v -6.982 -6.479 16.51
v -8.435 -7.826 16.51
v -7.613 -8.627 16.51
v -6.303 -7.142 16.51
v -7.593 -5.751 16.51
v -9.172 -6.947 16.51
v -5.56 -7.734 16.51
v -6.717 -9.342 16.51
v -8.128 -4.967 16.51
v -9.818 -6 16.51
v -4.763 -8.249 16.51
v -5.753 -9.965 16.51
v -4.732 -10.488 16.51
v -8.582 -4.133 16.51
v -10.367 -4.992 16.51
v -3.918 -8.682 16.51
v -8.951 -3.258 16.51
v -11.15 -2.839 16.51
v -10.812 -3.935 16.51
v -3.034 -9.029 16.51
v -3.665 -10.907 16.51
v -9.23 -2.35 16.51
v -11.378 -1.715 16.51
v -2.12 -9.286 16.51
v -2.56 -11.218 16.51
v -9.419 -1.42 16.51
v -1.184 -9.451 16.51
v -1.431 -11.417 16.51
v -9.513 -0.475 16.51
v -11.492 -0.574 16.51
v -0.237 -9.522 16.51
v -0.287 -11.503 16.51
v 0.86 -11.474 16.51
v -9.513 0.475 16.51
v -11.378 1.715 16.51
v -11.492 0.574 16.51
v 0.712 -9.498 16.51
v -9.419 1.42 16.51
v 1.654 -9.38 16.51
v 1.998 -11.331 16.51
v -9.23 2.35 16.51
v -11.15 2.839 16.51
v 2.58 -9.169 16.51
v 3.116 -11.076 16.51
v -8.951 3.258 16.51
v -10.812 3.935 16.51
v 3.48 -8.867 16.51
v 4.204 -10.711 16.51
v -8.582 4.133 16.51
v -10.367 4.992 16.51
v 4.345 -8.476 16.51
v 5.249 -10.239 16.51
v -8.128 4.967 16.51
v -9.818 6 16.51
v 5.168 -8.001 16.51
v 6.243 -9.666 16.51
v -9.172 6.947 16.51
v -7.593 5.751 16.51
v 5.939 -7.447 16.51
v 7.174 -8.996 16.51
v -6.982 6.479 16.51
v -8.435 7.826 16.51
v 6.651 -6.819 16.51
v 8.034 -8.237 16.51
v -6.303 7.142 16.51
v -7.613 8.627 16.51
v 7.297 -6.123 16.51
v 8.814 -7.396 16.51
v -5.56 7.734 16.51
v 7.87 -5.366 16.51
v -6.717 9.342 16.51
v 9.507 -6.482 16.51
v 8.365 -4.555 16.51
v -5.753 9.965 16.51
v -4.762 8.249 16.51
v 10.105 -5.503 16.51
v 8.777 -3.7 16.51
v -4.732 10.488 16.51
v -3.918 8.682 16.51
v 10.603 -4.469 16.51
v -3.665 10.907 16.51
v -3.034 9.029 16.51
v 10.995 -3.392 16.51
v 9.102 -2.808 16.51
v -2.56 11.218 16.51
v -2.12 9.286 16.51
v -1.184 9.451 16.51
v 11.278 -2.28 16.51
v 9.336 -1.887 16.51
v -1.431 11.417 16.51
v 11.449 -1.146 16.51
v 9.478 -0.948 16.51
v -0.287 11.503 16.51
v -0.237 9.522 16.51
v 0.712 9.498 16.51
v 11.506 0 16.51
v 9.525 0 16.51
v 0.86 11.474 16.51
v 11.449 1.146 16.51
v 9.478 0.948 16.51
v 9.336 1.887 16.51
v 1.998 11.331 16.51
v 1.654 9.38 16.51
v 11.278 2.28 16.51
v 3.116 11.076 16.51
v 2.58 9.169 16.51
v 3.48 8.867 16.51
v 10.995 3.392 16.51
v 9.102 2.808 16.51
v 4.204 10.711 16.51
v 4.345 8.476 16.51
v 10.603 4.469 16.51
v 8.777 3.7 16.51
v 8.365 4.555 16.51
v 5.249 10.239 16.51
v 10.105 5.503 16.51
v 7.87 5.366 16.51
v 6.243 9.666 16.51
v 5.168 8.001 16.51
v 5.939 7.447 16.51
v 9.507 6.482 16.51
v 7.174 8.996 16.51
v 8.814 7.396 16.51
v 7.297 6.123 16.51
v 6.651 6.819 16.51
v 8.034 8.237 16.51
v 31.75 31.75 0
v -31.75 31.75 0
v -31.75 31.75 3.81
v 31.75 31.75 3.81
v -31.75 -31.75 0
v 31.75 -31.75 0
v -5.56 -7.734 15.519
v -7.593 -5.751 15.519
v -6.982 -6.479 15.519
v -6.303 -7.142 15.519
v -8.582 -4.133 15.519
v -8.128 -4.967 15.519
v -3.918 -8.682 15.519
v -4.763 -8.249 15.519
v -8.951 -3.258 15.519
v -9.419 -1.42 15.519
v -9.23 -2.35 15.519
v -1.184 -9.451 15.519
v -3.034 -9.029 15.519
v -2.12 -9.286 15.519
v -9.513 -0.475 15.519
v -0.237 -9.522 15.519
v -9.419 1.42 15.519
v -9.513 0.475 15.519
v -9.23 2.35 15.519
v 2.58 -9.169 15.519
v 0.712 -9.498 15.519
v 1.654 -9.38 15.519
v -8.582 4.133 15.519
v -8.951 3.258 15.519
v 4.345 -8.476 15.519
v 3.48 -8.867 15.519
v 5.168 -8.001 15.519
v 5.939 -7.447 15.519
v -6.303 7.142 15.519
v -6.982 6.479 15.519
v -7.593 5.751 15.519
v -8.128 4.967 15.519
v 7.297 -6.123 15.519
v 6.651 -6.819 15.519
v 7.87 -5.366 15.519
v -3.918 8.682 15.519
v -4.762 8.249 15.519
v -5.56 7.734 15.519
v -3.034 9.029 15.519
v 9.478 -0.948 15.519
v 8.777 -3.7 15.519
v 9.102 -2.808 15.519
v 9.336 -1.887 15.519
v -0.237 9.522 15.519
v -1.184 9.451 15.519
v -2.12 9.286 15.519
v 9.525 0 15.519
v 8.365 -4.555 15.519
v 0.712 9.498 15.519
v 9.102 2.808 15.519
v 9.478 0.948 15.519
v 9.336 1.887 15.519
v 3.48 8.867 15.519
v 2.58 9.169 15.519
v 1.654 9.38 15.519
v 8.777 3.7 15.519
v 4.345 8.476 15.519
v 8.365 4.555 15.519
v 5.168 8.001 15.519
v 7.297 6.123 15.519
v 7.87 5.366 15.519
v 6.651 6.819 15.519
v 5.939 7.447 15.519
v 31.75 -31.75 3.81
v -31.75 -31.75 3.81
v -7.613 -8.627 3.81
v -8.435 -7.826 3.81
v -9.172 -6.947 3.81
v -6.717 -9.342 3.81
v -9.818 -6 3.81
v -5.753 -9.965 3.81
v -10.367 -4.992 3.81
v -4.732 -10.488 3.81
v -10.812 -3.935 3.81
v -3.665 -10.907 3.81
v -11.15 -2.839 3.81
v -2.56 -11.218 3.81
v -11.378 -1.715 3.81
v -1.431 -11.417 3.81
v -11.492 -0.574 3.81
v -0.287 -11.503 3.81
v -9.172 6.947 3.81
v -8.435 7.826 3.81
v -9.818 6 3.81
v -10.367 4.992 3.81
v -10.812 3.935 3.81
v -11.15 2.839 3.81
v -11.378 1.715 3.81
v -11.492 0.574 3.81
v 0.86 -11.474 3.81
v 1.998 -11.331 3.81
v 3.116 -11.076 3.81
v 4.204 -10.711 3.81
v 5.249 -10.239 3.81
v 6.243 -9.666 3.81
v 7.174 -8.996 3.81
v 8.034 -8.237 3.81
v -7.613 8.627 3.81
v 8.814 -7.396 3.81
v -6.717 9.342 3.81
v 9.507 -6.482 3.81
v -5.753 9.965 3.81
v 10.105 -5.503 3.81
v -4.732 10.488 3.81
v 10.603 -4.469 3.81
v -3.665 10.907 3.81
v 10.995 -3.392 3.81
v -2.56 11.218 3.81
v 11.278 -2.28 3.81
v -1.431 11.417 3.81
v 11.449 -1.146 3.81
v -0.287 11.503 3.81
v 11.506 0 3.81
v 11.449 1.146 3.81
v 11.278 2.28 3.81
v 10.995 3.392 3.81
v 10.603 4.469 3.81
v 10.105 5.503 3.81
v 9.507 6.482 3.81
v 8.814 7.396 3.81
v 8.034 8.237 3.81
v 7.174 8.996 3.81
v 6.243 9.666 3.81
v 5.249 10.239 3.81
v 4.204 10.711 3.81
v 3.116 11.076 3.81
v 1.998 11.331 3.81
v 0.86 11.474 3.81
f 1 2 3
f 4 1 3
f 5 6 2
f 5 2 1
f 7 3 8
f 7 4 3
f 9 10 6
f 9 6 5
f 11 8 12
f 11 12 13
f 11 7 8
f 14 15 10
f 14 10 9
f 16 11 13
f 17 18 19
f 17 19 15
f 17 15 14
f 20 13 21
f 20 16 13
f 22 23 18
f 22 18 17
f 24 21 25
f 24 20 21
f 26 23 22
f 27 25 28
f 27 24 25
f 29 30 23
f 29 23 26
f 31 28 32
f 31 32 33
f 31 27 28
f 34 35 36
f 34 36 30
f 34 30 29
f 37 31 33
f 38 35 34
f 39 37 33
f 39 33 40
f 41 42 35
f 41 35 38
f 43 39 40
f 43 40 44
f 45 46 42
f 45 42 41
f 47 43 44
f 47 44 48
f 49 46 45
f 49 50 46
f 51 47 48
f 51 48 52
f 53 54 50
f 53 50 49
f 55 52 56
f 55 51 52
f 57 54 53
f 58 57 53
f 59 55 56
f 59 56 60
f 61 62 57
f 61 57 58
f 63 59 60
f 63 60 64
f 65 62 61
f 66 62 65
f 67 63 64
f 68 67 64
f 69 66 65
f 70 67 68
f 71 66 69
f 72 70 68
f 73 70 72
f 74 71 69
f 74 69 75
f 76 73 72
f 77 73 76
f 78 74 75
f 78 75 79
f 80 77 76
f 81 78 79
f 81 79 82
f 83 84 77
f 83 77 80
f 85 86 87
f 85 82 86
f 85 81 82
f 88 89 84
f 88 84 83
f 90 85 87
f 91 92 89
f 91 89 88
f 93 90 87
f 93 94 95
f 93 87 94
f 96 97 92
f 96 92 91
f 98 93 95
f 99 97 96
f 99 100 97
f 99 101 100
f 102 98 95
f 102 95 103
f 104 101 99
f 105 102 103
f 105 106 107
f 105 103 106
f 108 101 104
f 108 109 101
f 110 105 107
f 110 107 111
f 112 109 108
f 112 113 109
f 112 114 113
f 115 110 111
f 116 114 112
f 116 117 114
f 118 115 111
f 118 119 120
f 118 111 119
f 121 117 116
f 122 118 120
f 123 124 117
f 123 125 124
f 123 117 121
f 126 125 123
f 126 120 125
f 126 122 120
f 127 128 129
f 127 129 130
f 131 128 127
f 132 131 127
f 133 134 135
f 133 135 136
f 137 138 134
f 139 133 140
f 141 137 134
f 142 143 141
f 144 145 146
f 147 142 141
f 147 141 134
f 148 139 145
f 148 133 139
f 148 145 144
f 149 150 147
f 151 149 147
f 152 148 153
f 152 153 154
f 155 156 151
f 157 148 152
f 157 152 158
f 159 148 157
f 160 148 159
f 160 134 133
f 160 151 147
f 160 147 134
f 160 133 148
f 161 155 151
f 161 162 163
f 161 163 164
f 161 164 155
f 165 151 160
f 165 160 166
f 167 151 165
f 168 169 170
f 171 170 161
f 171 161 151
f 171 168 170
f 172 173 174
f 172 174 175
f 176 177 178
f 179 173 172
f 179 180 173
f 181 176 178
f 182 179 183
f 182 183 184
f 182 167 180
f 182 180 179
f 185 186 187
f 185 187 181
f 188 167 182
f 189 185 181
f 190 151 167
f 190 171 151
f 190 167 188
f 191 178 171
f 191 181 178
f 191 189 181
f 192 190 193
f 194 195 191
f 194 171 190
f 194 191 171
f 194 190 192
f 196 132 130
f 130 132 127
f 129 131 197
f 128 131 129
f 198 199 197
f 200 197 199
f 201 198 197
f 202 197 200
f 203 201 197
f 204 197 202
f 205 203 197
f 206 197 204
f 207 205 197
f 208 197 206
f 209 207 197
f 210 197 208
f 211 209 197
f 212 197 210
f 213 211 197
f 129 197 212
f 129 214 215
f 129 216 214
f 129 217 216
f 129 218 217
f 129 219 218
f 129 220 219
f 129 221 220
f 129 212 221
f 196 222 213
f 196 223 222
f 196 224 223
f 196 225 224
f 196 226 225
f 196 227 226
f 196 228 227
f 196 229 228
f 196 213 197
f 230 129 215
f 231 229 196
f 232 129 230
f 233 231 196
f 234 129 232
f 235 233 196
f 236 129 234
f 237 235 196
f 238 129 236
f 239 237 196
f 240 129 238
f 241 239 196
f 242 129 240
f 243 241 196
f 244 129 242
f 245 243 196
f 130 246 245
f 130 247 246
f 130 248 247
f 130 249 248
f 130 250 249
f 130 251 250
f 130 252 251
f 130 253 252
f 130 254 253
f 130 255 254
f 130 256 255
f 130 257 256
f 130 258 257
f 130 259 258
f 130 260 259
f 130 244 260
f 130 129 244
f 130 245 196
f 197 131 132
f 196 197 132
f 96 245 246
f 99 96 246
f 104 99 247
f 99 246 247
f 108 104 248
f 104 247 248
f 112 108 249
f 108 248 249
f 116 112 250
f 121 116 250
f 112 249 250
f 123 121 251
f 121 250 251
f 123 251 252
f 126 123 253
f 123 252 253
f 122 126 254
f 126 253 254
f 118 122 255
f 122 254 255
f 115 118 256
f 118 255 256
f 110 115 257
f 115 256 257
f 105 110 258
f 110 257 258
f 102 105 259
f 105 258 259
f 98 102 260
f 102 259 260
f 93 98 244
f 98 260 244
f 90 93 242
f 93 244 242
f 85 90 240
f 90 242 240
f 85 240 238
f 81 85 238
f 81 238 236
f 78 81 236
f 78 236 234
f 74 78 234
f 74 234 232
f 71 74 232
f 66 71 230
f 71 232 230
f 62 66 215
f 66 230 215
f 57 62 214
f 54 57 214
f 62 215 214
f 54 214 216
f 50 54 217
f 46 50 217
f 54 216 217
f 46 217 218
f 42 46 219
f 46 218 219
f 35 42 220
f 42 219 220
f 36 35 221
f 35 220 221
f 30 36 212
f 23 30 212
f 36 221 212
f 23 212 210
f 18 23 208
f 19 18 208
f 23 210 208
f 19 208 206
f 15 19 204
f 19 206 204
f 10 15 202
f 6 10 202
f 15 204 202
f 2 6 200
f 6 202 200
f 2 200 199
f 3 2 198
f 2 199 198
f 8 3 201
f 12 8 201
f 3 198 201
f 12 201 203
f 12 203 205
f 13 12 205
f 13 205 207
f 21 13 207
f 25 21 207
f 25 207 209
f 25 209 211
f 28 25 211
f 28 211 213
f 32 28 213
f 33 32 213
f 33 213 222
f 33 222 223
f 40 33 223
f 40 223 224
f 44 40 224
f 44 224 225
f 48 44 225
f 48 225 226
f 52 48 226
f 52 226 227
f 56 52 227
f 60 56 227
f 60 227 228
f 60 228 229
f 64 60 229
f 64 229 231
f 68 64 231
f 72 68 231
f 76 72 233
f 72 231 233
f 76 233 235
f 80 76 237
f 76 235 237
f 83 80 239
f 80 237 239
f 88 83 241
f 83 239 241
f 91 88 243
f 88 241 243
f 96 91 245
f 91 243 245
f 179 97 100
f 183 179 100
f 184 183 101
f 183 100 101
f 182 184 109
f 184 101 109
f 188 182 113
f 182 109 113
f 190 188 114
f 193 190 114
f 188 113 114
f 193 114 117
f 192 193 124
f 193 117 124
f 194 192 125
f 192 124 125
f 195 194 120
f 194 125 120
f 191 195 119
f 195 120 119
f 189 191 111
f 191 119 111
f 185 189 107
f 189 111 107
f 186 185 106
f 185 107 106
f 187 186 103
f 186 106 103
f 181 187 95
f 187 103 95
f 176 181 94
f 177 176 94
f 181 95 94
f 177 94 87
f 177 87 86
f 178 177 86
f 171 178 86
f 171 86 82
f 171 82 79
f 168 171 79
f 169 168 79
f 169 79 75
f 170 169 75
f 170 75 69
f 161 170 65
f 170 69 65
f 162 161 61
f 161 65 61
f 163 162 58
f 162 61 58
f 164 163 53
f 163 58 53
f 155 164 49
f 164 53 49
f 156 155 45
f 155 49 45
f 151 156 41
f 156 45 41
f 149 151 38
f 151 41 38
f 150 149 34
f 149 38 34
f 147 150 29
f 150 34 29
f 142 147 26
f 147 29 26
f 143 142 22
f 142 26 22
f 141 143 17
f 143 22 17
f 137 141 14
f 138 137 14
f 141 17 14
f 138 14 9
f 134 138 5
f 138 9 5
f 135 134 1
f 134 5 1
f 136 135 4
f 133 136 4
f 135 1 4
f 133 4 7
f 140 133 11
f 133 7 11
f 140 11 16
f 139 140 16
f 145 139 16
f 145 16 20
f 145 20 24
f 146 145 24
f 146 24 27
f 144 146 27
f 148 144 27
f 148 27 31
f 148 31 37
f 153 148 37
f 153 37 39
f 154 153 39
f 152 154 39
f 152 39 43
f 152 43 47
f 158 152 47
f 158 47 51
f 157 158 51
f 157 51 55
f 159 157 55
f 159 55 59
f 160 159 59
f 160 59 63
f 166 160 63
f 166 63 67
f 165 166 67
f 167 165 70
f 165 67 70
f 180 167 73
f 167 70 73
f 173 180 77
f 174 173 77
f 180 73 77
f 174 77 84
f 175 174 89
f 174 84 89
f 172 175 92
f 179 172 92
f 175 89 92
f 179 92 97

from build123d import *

# Parameters (mm, degrees)
F0_W     = 63.5
F0_H     = 63.499996
F1_DEPTH = 3.81
F2_R     = 11.5062
F3_DEPTH = 12.7
F4_R     = 9.525
F5_DEPTH = 0.9906


with BuildPart() as f1:
    # F0 (on Top) → F1 (new body)
    with BuildSketch(Plane.XY):
        Rectangle(F0_W, F0_H)
    extrude(amount=F1_DEPTH)

    # F2 (on face) → F3 (join)
    with BuildSketch(Plane.XY.offset(3.81)):
        Circle(F2_R)
    extrude(amount=F3_DEPTH)

    # F4 (on face) → F5 (cut)
    with BuildSketch(Plane.XY.offset(16.51)):
        Circle(F4_R)
    extrude(amount=-F5_DEPTH, mode=Mode.SUBTRACT)


solid = f1.part
